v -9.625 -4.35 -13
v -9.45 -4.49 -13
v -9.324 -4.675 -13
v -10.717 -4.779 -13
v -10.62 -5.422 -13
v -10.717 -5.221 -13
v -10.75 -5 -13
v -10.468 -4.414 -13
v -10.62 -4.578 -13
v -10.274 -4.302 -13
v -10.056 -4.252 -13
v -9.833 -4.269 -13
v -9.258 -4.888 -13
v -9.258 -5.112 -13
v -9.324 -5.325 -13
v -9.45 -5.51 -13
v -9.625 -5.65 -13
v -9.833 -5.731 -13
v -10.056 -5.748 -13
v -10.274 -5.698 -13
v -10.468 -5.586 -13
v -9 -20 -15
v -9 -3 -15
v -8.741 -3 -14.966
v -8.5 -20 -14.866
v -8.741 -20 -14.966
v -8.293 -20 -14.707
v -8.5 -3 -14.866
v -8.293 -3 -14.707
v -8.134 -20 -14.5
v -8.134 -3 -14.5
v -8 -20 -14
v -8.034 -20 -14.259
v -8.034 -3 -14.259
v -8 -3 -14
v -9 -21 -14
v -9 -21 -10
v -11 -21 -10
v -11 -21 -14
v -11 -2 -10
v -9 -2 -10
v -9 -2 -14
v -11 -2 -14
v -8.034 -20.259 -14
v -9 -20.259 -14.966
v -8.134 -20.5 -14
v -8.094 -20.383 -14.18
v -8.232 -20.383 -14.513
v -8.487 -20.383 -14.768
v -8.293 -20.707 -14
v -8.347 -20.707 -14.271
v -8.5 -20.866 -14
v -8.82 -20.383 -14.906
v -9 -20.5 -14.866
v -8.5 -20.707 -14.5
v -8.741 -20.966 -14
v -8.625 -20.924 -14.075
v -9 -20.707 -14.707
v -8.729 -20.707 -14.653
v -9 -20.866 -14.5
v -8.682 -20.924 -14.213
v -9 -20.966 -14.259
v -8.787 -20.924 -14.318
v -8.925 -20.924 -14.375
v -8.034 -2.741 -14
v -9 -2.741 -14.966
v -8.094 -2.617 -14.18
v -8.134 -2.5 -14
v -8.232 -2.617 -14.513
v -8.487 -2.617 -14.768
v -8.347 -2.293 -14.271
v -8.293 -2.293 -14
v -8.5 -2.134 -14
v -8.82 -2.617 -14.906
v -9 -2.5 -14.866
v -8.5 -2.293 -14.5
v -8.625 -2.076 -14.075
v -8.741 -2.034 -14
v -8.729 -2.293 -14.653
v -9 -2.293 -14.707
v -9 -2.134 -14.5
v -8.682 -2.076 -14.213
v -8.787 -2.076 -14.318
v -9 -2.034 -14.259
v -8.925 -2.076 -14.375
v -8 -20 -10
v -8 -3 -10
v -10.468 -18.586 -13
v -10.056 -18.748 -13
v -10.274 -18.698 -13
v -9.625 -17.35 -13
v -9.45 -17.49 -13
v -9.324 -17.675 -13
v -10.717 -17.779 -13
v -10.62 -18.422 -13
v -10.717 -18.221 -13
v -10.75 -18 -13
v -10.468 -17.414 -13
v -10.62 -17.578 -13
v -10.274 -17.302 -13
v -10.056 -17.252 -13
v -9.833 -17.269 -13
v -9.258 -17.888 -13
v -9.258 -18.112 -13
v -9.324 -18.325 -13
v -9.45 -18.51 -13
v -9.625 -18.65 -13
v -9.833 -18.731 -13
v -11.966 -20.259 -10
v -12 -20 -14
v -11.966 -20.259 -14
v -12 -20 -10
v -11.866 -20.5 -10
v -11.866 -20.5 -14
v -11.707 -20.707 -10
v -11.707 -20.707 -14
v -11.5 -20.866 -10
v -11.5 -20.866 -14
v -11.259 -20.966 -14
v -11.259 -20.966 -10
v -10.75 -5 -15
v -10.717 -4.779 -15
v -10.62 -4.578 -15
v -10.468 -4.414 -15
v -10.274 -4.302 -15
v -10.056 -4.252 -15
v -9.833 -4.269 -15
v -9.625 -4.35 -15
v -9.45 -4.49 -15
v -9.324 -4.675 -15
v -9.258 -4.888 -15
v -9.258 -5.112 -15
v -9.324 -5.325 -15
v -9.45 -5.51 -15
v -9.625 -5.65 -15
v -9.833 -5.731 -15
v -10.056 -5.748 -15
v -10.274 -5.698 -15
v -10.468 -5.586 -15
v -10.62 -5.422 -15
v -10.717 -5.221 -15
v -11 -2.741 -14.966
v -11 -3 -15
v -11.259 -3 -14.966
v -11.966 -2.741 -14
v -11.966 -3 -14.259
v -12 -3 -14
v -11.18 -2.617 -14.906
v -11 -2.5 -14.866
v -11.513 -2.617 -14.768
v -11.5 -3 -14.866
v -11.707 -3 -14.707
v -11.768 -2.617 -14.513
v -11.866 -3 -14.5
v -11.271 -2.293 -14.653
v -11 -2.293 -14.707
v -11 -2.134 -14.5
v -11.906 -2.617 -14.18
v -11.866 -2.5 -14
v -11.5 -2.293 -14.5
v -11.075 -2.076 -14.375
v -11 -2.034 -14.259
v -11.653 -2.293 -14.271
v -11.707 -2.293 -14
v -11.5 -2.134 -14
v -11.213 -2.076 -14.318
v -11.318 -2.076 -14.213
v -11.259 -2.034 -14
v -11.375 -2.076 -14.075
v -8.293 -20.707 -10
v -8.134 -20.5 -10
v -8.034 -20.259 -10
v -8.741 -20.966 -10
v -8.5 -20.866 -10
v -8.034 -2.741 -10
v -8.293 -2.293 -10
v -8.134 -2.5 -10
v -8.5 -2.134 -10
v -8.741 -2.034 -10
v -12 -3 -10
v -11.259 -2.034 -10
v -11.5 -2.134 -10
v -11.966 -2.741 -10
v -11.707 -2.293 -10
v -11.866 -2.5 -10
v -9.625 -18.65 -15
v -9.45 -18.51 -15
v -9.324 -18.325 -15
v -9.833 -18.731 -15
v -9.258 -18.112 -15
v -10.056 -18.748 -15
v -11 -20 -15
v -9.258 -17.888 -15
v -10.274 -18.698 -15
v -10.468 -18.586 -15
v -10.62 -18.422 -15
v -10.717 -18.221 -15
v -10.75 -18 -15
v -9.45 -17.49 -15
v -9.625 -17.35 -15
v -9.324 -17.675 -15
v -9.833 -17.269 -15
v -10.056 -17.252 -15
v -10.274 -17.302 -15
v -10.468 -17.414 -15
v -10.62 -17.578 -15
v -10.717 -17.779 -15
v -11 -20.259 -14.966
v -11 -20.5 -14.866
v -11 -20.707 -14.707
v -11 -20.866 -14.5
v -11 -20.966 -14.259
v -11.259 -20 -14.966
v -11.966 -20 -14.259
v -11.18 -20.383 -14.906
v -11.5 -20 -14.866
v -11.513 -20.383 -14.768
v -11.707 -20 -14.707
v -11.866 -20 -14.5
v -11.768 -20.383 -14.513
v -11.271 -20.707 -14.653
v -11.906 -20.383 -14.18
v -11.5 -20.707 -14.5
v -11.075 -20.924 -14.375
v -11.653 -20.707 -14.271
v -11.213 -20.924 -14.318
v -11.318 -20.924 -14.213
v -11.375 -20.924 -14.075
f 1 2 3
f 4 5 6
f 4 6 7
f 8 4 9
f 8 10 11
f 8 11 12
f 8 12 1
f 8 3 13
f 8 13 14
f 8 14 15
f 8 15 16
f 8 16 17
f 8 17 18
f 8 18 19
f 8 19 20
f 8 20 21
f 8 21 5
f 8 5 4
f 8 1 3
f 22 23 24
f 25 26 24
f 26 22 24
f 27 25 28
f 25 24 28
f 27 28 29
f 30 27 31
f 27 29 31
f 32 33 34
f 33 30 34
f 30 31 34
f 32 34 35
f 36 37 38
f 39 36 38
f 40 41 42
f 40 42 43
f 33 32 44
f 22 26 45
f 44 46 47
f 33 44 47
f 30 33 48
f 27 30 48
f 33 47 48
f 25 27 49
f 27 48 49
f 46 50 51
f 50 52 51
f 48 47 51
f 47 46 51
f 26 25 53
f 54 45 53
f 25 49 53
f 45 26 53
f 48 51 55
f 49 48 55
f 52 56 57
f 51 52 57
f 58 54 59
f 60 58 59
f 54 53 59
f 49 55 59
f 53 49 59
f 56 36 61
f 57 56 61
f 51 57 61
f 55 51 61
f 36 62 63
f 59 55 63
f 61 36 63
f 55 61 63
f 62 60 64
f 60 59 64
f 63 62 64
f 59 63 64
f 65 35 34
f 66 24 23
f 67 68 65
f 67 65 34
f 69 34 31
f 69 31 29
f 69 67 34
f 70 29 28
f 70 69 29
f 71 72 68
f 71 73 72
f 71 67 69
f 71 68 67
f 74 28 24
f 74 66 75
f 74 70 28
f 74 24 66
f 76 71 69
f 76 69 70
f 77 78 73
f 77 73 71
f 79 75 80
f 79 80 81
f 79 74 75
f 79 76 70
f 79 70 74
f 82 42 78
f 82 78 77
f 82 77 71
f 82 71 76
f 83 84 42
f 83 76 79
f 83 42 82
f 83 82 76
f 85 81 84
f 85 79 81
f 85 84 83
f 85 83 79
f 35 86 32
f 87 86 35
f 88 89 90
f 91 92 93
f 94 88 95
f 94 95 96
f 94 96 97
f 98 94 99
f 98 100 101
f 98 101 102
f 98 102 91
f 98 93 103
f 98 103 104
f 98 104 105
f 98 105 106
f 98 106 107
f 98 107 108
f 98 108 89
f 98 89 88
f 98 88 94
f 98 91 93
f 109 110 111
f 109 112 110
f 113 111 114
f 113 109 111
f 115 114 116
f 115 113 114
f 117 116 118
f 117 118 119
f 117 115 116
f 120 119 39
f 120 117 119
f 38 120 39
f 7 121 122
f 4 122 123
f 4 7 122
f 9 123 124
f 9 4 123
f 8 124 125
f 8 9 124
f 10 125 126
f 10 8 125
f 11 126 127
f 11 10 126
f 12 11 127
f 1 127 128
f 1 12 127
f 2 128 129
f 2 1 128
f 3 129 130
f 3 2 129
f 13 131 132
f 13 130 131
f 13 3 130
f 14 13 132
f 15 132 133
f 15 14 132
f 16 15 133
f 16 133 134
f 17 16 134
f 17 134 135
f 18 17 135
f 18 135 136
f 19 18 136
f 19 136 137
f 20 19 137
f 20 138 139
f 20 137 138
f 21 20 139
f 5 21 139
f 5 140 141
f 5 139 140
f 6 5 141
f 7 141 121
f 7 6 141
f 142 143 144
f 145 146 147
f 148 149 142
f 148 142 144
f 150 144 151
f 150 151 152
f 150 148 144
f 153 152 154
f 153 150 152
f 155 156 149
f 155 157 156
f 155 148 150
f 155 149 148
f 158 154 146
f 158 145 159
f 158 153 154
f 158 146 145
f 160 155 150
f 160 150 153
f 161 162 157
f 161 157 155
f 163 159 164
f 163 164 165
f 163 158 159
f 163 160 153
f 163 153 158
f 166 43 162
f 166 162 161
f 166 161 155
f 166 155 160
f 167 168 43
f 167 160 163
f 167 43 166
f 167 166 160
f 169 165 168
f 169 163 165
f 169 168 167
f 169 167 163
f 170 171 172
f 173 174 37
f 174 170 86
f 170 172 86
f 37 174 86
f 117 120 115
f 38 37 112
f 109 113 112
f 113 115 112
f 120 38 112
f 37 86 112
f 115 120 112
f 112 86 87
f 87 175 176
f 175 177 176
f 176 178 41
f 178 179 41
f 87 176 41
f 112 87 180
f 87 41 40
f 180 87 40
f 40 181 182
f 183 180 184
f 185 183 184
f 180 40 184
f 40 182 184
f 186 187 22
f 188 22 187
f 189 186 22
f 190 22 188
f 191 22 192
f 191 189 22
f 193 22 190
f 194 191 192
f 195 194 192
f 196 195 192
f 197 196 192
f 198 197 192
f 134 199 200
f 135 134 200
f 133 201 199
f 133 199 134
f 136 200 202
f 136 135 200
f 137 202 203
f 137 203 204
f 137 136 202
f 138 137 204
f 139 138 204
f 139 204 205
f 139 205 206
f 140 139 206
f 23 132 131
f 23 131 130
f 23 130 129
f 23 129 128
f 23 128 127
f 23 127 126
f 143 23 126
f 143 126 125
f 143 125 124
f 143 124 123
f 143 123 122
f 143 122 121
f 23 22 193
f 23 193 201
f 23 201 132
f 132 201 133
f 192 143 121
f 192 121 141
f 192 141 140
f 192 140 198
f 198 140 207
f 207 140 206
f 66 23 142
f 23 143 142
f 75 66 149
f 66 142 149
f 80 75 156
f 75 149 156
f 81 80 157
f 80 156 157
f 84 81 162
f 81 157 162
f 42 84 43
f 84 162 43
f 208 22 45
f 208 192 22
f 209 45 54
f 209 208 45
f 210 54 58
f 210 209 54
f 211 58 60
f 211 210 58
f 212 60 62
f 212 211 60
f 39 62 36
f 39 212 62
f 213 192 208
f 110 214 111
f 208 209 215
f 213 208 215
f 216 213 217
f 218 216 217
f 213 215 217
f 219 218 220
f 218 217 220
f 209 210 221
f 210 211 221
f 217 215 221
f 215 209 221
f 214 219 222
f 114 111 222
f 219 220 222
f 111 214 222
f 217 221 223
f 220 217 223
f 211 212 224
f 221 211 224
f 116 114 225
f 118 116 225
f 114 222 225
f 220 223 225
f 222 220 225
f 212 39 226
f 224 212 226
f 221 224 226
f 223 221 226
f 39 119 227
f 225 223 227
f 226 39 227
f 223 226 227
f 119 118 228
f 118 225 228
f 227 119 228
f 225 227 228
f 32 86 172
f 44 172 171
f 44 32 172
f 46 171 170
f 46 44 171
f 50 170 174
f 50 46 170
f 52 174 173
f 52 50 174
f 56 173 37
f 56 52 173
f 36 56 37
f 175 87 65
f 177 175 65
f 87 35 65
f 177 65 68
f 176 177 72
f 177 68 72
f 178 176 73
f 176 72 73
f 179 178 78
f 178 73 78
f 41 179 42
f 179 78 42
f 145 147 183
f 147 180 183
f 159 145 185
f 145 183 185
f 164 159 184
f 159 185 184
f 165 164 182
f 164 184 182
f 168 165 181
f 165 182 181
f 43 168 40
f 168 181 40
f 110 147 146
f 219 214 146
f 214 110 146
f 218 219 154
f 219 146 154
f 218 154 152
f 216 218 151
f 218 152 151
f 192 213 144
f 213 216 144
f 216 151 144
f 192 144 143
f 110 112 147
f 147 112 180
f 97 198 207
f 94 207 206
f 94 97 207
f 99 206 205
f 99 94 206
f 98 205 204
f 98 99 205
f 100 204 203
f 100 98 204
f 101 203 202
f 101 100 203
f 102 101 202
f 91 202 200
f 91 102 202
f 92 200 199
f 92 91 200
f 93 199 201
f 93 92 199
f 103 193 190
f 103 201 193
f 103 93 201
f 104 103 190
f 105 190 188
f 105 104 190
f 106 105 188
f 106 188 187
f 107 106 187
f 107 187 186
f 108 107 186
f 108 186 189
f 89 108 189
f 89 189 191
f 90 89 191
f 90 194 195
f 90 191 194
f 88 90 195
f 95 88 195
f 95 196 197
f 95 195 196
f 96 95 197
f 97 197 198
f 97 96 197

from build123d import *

# Parameters (mm, degrees)
CYLINDER047_R          = 0.75
CYLINDER047_DEPTH      = 10
CYLINDER046_R          = 0.75
CYLINDER046_DEPTH      = 10
BOX034_W               = 4
BOX034_H               = 19
BOX034_DEPTH           = 5
FILLET008_R            = 1
FILLET009_R            = 1
FILLET010_R            = 1
FILLET011_R            = 1
CUT066_PLACEMENT_ANGLE = 180


with BuildPart() as cilindro047:
    # Cylinder047 → Cylinder047 (new body)
    with BuildSketch(Plane(origin=(-39, 66, 48), x_dir=(1, 0, 0), z_dir=(0, 0, 1))):
        Circle(CYLINDER047_R)
    extrude(amount=CYLINDER047_DEPTH)


with BuildPart() as cilindro046:
    # Cylinder046 → Cylinder046 (new body)
    with BuildSketch(Plane(origin=(-39, 53, 48), x_dir=(1, 0, 0), z_dir=(0, 0, 1))):
        Circle(CYLINDER046_R)
    extrude(amount=CYLINDER046_DEPTH)


with BuildPart() as cut066:
    # Box034 → Box034 (new body)
    with BuildSketch(Plane(origin=(-2, 50, 45), x_dir=(1, 0, 0), z_dir=(0, 0, 1))):
        with Locations((2, 9.5)):
            Rectangle(BOX034_W, BOX034_H)
    extrude(amount=BOX034_DEPTH)

    # Fillet008
    fillet008_edges = [cut066.edges().sort_by_distance(p)[0] for p in [
        (2, 59.5, 50),
    ]]
    fillet(fillet008_edges, radius=FILLET008_R)

    # Fillet009
    fillet009_edges = [cut066.edges().sort_by_distance(p)[0] for p in [
        (-2, 59.5, 50),
    ]]
    fillet(fillet009_edges, radius=FILLET009_R)

    # Fillet010
    fillet010_edges = [cut066.edges().sort_by_distance(p)[0] for p in [
        (0, 69, 50),
    ]]
    fillet(fillet010_edges, radius=FILLET010_R)

    # Fillet011
    fillet011_edges = [cut066.edges().sort_by_distance(p)[0] for p in [
        (0, 50, 50),
    ]]
    fillet(fillet011_edges, radius=FILLET011_R)


with BuildPart() as cut066_1:
    # Fillet011 placement: moved
    add(cut066.part.moved(Location((-39, 0, 0))))

    # Cut065: cut Cilindro046
    add(cilindro046.part, mode=Mode.SUBTRACT)

    # Cut066: cut Cilindro047
    add(cilindro047.part, mode=Mode.SUBTRACT)


with BuildPart() as cut066_2:
    # Cut066 placement: moved
    add(cut066_1.part.moved(Location((-49, -71, 35))).rotate(Axis((-49, -71, 35), (0, 1, 0)), CUT066_PLACEMENT_ANGLE))


solid = cut066_2.part
